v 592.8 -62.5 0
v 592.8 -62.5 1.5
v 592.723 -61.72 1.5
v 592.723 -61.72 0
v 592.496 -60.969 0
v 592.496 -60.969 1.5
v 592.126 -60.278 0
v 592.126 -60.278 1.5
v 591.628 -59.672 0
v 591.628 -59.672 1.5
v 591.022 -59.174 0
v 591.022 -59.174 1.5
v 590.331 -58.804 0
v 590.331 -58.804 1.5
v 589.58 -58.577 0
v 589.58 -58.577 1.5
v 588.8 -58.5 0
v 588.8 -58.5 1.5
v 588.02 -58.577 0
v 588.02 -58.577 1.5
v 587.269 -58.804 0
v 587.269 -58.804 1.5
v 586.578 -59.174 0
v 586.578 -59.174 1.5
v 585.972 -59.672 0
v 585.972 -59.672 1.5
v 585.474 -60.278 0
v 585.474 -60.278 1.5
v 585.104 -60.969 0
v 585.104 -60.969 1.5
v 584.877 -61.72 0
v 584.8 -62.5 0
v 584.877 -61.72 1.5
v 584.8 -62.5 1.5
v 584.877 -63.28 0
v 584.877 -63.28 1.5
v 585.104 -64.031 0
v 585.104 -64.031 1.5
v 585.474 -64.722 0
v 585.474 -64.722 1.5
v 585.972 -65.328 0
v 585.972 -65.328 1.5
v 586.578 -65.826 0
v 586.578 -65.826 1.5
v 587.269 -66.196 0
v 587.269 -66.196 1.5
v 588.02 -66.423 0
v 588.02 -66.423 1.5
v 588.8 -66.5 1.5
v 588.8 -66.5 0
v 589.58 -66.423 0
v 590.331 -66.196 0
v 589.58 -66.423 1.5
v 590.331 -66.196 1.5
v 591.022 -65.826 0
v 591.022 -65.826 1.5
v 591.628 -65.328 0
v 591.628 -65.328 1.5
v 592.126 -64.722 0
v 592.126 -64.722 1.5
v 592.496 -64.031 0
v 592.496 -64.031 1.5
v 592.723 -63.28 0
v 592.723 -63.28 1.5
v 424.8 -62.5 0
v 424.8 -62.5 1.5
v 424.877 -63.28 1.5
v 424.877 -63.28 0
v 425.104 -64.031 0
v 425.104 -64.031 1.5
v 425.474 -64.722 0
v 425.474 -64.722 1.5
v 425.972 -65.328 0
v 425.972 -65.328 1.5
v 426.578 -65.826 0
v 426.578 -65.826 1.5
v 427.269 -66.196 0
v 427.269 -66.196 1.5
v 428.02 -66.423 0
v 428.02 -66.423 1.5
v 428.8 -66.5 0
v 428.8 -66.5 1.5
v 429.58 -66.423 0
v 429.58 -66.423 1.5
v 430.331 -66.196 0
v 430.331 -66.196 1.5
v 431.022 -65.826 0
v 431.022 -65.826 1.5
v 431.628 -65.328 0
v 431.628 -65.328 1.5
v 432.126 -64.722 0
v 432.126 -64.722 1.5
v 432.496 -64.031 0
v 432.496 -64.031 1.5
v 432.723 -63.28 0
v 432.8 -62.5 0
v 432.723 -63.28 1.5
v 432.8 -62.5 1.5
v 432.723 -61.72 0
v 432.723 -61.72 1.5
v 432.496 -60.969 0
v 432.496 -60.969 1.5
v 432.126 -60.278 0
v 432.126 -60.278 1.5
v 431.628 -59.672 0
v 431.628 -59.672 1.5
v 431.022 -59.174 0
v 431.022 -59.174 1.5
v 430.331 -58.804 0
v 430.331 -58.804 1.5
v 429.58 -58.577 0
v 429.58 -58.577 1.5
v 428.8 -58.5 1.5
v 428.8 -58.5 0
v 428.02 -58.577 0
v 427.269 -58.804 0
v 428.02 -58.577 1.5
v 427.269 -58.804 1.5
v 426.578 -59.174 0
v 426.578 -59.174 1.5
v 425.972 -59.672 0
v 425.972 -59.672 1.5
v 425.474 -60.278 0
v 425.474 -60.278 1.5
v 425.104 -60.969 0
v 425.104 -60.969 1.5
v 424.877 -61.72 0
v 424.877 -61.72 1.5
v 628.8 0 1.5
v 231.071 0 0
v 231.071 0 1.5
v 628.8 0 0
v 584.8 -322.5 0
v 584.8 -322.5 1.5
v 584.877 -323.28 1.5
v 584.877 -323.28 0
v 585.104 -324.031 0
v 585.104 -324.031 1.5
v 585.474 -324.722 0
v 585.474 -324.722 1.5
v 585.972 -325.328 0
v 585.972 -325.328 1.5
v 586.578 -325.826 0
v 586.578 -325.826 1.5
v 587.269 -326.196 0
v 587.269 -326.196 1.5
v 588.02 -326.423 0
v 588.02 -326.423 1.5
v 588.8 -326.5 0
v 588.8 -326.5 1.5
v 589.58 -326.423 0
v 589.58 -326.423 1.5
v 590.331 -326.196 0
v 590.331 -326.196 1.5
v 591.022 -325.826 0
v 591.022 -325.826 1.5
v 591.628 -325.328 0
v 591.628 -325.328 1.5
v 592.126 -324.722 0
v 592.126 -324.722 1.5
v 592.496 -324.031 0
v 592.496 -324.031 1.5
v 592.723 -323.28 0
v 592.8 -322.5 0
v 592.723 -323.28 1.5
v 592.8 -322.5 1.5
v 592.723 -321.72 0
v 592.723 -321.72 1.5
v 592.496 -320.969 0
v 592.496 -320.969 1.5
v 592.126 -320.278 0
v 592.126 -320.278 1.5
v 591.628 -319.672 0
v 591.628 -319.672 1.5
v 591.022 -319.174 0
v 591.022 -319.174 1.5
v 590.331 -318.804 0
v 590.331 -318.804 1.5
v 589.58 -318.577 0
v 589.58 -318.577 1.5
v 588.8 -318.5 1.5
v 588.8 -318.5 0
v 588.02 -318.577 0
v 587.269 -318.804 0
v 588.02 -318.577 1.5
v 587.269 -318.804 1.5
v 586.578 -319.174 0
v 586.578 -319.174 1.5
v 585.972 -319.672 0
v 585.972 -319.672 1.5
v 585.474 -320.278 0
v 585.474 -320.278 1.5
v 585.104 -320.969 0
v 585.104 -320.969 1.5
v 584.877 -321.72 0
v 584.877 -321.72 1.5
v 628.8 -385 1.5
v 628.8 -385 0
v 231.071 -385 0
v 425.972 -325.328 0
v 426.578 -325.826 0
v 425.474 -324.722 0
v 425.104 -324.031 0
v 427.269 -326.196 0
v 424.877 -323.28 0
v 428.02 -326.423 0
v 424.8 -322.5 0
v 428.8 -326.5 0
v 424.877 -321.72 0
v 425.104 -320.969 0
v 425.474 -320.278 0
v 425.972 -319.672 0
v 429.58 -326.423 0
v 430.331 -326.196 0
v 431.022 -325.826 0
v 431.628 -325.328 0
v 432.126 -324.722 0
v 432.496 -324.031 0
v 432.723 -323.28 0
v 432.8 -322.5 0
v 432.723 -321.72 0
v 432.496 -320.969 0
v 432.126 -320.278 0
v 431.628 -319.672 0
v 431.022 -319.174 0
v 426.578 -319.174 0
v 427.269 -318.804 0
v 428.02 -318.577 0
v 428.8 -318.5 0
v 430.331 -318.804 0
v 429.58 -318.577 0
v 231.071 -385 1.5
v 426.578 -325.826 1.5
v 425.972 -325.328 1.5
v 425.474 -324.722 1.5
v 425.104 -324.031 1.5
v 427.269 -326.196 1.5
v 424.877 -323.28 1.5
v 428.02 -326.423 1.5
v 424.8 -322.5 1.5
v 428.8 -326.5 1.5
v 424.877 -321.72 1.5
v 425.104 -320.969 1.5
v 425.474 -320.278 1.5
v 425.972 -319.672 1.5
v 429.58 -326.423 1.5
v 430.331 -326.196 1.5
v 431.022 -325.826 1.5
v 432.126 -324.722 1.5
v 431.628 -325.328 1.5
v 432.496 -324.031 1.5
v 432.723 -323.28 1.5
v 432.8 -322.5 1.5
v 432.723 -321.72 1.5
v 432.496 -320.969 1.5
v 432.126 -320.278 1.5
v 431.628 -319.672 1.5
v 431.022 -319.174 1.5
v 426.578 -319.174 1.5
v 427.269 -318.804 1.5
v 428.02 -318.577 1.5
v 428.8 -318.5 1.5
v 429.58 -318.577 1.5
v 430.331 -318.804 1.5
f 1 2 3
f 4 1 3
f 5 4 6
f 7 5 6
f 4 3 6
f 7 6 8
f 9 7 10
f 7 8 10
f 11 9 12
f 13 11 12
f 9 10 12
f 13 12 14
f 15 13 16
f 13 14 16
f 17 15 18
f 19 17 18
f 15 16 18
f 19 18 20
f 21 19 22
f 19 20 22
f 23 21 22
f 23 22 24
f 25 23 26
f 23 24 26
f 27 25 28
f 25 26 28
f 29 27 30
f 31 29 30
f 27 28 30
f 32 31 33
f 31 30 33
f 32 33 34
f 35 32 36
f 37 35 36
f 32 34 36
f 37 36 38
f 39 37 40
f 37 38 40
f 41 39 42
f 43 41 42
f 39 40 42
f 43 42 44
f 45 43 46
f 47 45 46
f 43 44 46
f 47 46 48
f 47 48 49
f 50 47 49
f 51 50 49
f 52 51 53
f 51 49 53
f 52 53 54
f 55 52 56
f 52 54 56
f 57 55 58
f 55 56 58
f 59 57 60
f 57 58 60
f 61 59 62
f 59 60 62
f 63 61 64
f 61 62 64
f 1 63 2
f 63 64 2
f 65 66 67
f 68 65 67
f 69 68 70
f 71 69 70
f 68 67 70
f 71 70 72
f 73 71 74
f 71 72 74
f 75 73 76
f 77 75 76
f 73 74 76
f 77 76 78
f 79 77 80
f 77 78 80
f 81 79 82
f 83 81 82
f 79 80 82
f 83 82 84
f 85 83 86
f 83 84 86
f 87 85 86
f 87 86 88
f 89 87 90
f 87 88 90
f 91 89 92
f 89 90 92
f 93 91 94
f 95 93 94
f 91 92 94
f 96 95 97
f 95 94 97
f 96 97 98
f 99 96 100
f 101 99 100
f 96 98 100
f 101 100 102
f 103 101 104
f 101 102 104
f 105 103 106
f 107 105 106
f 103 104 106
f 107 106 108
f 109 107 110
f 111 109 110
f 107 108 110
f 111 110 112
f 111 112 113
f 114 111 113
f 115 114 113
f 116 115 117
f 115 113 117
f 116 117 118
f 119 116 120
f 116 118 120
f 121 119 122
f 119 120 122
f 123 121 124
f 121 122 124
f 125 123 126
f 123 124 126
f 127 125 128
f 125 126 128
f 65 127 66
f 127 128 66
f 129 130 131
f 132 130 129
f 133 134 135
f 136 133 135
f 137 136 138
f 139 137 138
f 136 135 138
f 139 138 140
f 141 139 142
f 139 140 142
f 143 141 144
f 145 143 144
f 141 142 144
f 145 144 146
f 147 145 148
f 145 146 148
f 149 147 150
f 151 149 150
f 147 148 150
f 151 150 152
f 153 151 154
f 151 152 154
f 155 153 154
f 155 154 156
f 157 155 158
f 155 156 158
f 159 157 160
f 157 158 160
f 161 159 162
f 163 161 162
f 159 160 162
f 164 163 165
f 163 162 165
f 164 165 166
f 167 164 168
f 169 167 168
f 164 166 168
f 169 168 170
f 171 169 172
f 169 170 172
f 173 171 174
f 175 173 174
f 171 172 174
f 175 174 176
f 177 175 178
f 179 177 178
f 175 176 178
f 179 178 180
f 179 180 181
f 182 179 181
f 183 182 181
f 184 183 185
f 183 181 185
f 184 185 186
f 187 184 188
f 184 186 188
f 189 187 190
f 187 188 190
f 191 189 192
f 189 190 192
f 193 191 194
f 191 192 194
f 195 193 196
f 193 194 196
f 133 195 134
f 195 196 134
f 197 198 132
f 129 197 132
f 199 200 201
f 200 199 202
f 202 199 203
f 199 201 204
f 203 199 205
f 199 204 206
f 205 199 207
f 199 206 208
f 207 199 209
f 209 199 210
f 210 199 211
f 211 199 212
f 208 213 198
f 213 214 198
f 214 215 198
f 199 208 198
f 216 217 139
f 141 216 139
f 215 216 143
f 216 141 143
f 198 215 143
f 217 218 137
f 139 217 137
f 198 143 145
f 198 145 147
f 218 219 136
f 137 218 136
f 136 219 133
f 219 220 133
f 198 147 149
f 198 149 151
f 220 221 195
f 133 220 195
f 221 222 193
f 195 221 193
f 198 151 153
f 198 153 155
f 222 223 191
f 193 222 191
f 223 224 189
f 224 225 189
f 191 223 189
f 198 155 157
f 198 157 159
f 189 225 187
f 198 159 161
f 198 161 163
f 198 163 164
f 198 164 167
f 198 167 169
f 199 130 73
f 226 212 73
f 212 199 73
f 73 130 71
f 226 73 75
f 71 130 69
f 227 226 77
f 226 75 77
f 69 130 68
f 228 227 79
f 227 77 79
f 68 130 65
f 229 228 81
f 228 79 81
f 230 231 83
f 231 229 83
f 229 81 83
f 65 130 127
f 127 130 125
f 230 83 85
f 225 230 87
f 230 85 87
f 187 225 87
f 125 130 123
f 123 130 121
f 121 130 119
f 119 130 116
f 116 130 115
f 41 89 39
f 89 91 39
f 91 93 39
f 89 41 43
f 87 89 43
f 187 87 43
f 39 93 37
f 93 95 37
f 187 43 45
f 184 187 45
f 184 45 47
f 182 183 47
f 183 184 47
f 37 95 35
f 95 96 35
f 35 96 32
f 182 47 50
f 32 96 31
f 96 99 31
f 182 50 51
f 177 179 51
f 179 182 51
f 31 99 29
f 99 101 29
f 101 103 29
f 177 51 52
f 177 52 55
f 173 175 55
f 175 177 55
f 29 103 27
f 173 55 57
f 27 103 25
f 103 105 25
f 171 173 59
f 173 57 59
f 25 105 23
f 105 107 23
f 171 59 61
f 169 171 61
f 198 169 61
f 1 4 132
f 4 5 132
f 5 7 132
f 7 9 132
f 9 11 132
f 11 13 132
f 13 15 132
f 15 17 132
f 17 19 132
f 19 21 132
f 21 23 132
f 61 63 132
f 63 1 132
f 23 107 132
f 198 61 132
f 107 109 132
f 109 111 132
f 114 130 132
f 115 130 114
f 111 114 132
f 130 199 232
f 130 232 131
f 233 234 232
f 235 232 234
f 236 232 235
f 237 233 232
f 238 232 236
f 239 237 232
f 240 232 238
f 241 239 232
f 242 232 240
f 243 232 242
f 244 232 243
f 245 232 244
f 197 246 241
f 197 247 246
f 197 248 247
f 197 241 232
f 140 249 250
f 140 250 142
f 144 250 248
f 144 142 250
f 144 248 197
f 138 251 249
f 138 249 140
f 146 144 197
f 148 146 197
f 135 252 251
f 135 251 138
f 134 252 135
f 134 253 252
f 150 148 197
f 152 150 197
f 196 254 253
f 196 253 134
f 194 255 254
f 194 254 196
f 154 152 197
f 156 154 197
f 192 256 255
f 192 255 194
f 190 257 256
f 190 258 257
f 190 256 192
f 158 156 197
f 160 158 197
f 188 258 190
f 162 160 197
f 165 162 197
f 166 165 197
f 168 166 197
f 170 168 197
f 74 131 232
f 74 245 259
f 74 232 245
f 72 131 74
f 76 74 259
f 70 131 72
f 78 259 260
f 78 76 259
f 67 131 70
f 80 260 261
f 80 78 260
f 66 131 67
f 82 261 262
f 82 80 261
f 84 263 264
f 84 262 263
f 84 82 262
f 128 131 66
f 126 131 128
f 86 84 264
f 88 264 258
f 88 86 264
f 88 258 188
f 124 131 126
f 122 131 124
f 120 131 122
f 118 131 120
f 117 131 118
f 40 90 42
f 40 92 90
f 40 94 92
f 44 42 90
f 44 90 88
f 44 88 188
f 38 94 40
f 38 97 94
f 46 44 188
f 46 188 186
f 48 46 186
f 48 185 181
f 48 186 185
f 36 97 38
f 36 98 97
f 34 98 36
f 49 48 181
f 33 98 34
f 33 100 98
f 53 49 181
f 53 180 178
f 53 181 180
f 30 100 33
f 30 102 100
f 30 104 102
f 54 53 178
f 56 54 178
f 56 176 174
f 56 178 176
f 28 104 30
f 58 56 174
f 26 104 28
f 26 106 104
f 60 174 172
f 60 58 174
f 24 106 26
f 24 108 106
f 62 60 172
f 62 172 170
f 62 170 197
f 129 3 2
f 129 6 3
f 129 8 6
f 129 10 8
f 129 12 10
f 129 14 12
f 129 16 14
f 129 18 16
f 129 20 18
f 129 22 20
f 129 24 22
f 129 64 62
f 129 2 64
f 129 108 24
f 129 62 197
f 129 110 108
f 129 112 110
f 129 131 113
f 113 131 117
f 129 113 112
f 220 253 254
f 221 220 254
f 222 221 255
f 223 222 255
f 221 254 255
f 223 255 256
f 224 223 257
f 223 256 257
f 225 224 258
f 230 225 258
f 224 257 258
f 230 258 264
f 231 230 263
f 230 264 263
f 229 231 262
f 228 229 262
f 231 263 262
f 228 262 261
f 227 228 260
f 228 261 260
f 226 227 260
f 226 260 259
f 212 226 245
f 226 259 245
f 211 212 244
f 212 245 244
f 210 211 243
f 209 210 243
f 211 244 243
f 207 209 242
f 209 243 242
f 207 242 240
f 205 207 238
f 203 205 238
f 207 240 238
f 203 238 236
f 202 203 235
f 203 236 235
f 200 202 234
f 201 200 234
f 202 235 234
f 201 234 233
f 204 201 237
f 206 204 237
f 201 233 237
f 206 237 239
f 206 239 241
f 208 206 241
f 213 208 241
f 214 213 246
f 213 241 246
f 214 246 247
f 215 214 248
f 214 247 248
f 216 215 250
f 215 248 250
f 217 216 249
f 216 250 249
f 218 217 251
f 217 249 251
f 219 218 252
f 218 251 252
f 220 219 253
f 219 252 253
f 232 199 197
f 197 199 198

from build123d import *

# Parameters (mm, degrees)
SKETCH1_W           = 397.728686166
SKETCH1_H           = 385
BOSS_EXTRUDE1_DEPTH = 1.5
SKETCH2_R           = 4
CUT_EXTRUDE1_DEPTH  = 1.5


with BuildPart() as part:
    # Sketch1 → Boss-Extrude1 (new body)
    with BuildSketch(Plane.XY):
        with Locations((429.935656917, -192.5)):
            Rectangle(SKETCH1_W, SKETCH1_H)
    extrude(amount=BOSS_EXTRUDE1_DEPTH)

    # Sketch2 → Cut-Extrude1 (cut)
    with BuildSketch(Plane.XY.offset(1.5)):
        with Locations((588.8, -62.5)):
            Circle(SKETCH2_R)
        with Locations(Location((588.8, -322.5, 0), (0, 0, 180))):
            Circle(SKETCH2_R)
        with Locations(Location((428.8, -62.5, 0), (0, 0, 180))):
            Circle(SKETCH2_R)
        with Locations((428.8, -322.5)):
            Circle(SKETCH2_R)
    extrude(amount=-CUT_EXTRUDE1_DEPTH, mode=Mode.SUBTRACT)


solid = part.part
